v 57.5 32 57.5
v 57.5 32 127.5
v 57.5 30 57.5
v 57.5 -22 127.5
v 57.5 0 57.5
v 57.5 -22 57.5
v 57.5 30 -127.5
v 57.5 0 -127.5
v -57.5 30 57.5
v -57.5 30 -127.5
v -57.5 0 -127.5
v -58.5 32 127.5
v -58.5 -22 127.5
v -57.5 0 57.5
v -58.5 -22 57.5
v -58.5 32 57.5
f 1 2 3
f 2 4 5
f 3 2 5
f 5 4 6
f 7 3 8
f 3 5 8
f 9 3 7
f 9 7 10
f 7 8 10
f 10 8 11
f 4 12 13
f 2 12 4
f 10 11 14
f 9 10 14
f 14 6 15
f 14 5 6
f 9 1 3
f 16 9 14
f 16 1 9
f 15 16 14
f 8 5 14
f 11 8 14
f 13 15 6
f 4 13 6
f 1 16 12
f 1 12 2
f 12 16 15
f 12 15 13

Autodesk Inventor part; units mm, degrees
ref_plane "YZ Plane" through (0, 0, 0) normal (1, 0, 0) x (0, 1, 0)
ref_plane "XZ Plane" through (0, 0, 0) normal (0, 1, 0) x (-1, 0, 0)
ref_plane "XY Plane" through (0, 0, 0) normal (0, 0, 1) x (1, 0, 0)
sketch "Sketch1" plane through (0, 0, 0) normal (0, 1, 0) x (-1, 0, 0)
  line L0 (-57.5, -127.5) -> (57.5, -127.5)
  line L1 (57.5, -127.5) -> (57.5, 127.5)
  line L2 (57.5, 127.5) -> (-57.5, 127.5)
  line L3 (-57.5, 127.5) -> (-57.5, -127.5)
  line L4 (-57.5, -127.5) -> (57.5, 127.5) construction
  line L5 (57.5, -127.5) -> (-57.5, 127.5) construction
  point P0 (0, 0)
  dimension "d0" = 115
  dimension "d1" = 255
extrude "Extrusion1" add sketch "Sketch1" along normal blind 30
sketch "Sketch2" plane through (0, 30, 0) normal (0, 1, 0) x (1, 0, 0)
  line L0 (-57.5, -127.5) -> (57.5, -127.5) projected
  line L1 (58.5, -57.5) -> (-58.5, -57.5)
  line L2 (-58.5, -57.5) -> (-58.5, -127.5)
  line L3 (-58.5, -127.5) -> (58.5, -127.5)
  line L4 (58.5, -127.5) -> (58.5, -57.5)
  line L5 (58.5, -57.5) -> (-58.5, -127.5) construction
  line L6 (-58.5, -57.5) -> (58.5, -127.5) construction
  line L7 (57.5, -57.5) -> (57.5, -127.5)
  point P0 (0, 0)
  point P1 (0, -92.5)
  dimension "d4" = 35
  dimension "d5" = 117
extrude "Extrusion2" add sketch "Sketch2" along normal blind 2 contours L3 L2 L1 L7 L0
extrude "Extrusion3" add sketch "Sketch2" against normal blind 52 contours L3 L2 L1 L7 L0
properties part number "PSU"
